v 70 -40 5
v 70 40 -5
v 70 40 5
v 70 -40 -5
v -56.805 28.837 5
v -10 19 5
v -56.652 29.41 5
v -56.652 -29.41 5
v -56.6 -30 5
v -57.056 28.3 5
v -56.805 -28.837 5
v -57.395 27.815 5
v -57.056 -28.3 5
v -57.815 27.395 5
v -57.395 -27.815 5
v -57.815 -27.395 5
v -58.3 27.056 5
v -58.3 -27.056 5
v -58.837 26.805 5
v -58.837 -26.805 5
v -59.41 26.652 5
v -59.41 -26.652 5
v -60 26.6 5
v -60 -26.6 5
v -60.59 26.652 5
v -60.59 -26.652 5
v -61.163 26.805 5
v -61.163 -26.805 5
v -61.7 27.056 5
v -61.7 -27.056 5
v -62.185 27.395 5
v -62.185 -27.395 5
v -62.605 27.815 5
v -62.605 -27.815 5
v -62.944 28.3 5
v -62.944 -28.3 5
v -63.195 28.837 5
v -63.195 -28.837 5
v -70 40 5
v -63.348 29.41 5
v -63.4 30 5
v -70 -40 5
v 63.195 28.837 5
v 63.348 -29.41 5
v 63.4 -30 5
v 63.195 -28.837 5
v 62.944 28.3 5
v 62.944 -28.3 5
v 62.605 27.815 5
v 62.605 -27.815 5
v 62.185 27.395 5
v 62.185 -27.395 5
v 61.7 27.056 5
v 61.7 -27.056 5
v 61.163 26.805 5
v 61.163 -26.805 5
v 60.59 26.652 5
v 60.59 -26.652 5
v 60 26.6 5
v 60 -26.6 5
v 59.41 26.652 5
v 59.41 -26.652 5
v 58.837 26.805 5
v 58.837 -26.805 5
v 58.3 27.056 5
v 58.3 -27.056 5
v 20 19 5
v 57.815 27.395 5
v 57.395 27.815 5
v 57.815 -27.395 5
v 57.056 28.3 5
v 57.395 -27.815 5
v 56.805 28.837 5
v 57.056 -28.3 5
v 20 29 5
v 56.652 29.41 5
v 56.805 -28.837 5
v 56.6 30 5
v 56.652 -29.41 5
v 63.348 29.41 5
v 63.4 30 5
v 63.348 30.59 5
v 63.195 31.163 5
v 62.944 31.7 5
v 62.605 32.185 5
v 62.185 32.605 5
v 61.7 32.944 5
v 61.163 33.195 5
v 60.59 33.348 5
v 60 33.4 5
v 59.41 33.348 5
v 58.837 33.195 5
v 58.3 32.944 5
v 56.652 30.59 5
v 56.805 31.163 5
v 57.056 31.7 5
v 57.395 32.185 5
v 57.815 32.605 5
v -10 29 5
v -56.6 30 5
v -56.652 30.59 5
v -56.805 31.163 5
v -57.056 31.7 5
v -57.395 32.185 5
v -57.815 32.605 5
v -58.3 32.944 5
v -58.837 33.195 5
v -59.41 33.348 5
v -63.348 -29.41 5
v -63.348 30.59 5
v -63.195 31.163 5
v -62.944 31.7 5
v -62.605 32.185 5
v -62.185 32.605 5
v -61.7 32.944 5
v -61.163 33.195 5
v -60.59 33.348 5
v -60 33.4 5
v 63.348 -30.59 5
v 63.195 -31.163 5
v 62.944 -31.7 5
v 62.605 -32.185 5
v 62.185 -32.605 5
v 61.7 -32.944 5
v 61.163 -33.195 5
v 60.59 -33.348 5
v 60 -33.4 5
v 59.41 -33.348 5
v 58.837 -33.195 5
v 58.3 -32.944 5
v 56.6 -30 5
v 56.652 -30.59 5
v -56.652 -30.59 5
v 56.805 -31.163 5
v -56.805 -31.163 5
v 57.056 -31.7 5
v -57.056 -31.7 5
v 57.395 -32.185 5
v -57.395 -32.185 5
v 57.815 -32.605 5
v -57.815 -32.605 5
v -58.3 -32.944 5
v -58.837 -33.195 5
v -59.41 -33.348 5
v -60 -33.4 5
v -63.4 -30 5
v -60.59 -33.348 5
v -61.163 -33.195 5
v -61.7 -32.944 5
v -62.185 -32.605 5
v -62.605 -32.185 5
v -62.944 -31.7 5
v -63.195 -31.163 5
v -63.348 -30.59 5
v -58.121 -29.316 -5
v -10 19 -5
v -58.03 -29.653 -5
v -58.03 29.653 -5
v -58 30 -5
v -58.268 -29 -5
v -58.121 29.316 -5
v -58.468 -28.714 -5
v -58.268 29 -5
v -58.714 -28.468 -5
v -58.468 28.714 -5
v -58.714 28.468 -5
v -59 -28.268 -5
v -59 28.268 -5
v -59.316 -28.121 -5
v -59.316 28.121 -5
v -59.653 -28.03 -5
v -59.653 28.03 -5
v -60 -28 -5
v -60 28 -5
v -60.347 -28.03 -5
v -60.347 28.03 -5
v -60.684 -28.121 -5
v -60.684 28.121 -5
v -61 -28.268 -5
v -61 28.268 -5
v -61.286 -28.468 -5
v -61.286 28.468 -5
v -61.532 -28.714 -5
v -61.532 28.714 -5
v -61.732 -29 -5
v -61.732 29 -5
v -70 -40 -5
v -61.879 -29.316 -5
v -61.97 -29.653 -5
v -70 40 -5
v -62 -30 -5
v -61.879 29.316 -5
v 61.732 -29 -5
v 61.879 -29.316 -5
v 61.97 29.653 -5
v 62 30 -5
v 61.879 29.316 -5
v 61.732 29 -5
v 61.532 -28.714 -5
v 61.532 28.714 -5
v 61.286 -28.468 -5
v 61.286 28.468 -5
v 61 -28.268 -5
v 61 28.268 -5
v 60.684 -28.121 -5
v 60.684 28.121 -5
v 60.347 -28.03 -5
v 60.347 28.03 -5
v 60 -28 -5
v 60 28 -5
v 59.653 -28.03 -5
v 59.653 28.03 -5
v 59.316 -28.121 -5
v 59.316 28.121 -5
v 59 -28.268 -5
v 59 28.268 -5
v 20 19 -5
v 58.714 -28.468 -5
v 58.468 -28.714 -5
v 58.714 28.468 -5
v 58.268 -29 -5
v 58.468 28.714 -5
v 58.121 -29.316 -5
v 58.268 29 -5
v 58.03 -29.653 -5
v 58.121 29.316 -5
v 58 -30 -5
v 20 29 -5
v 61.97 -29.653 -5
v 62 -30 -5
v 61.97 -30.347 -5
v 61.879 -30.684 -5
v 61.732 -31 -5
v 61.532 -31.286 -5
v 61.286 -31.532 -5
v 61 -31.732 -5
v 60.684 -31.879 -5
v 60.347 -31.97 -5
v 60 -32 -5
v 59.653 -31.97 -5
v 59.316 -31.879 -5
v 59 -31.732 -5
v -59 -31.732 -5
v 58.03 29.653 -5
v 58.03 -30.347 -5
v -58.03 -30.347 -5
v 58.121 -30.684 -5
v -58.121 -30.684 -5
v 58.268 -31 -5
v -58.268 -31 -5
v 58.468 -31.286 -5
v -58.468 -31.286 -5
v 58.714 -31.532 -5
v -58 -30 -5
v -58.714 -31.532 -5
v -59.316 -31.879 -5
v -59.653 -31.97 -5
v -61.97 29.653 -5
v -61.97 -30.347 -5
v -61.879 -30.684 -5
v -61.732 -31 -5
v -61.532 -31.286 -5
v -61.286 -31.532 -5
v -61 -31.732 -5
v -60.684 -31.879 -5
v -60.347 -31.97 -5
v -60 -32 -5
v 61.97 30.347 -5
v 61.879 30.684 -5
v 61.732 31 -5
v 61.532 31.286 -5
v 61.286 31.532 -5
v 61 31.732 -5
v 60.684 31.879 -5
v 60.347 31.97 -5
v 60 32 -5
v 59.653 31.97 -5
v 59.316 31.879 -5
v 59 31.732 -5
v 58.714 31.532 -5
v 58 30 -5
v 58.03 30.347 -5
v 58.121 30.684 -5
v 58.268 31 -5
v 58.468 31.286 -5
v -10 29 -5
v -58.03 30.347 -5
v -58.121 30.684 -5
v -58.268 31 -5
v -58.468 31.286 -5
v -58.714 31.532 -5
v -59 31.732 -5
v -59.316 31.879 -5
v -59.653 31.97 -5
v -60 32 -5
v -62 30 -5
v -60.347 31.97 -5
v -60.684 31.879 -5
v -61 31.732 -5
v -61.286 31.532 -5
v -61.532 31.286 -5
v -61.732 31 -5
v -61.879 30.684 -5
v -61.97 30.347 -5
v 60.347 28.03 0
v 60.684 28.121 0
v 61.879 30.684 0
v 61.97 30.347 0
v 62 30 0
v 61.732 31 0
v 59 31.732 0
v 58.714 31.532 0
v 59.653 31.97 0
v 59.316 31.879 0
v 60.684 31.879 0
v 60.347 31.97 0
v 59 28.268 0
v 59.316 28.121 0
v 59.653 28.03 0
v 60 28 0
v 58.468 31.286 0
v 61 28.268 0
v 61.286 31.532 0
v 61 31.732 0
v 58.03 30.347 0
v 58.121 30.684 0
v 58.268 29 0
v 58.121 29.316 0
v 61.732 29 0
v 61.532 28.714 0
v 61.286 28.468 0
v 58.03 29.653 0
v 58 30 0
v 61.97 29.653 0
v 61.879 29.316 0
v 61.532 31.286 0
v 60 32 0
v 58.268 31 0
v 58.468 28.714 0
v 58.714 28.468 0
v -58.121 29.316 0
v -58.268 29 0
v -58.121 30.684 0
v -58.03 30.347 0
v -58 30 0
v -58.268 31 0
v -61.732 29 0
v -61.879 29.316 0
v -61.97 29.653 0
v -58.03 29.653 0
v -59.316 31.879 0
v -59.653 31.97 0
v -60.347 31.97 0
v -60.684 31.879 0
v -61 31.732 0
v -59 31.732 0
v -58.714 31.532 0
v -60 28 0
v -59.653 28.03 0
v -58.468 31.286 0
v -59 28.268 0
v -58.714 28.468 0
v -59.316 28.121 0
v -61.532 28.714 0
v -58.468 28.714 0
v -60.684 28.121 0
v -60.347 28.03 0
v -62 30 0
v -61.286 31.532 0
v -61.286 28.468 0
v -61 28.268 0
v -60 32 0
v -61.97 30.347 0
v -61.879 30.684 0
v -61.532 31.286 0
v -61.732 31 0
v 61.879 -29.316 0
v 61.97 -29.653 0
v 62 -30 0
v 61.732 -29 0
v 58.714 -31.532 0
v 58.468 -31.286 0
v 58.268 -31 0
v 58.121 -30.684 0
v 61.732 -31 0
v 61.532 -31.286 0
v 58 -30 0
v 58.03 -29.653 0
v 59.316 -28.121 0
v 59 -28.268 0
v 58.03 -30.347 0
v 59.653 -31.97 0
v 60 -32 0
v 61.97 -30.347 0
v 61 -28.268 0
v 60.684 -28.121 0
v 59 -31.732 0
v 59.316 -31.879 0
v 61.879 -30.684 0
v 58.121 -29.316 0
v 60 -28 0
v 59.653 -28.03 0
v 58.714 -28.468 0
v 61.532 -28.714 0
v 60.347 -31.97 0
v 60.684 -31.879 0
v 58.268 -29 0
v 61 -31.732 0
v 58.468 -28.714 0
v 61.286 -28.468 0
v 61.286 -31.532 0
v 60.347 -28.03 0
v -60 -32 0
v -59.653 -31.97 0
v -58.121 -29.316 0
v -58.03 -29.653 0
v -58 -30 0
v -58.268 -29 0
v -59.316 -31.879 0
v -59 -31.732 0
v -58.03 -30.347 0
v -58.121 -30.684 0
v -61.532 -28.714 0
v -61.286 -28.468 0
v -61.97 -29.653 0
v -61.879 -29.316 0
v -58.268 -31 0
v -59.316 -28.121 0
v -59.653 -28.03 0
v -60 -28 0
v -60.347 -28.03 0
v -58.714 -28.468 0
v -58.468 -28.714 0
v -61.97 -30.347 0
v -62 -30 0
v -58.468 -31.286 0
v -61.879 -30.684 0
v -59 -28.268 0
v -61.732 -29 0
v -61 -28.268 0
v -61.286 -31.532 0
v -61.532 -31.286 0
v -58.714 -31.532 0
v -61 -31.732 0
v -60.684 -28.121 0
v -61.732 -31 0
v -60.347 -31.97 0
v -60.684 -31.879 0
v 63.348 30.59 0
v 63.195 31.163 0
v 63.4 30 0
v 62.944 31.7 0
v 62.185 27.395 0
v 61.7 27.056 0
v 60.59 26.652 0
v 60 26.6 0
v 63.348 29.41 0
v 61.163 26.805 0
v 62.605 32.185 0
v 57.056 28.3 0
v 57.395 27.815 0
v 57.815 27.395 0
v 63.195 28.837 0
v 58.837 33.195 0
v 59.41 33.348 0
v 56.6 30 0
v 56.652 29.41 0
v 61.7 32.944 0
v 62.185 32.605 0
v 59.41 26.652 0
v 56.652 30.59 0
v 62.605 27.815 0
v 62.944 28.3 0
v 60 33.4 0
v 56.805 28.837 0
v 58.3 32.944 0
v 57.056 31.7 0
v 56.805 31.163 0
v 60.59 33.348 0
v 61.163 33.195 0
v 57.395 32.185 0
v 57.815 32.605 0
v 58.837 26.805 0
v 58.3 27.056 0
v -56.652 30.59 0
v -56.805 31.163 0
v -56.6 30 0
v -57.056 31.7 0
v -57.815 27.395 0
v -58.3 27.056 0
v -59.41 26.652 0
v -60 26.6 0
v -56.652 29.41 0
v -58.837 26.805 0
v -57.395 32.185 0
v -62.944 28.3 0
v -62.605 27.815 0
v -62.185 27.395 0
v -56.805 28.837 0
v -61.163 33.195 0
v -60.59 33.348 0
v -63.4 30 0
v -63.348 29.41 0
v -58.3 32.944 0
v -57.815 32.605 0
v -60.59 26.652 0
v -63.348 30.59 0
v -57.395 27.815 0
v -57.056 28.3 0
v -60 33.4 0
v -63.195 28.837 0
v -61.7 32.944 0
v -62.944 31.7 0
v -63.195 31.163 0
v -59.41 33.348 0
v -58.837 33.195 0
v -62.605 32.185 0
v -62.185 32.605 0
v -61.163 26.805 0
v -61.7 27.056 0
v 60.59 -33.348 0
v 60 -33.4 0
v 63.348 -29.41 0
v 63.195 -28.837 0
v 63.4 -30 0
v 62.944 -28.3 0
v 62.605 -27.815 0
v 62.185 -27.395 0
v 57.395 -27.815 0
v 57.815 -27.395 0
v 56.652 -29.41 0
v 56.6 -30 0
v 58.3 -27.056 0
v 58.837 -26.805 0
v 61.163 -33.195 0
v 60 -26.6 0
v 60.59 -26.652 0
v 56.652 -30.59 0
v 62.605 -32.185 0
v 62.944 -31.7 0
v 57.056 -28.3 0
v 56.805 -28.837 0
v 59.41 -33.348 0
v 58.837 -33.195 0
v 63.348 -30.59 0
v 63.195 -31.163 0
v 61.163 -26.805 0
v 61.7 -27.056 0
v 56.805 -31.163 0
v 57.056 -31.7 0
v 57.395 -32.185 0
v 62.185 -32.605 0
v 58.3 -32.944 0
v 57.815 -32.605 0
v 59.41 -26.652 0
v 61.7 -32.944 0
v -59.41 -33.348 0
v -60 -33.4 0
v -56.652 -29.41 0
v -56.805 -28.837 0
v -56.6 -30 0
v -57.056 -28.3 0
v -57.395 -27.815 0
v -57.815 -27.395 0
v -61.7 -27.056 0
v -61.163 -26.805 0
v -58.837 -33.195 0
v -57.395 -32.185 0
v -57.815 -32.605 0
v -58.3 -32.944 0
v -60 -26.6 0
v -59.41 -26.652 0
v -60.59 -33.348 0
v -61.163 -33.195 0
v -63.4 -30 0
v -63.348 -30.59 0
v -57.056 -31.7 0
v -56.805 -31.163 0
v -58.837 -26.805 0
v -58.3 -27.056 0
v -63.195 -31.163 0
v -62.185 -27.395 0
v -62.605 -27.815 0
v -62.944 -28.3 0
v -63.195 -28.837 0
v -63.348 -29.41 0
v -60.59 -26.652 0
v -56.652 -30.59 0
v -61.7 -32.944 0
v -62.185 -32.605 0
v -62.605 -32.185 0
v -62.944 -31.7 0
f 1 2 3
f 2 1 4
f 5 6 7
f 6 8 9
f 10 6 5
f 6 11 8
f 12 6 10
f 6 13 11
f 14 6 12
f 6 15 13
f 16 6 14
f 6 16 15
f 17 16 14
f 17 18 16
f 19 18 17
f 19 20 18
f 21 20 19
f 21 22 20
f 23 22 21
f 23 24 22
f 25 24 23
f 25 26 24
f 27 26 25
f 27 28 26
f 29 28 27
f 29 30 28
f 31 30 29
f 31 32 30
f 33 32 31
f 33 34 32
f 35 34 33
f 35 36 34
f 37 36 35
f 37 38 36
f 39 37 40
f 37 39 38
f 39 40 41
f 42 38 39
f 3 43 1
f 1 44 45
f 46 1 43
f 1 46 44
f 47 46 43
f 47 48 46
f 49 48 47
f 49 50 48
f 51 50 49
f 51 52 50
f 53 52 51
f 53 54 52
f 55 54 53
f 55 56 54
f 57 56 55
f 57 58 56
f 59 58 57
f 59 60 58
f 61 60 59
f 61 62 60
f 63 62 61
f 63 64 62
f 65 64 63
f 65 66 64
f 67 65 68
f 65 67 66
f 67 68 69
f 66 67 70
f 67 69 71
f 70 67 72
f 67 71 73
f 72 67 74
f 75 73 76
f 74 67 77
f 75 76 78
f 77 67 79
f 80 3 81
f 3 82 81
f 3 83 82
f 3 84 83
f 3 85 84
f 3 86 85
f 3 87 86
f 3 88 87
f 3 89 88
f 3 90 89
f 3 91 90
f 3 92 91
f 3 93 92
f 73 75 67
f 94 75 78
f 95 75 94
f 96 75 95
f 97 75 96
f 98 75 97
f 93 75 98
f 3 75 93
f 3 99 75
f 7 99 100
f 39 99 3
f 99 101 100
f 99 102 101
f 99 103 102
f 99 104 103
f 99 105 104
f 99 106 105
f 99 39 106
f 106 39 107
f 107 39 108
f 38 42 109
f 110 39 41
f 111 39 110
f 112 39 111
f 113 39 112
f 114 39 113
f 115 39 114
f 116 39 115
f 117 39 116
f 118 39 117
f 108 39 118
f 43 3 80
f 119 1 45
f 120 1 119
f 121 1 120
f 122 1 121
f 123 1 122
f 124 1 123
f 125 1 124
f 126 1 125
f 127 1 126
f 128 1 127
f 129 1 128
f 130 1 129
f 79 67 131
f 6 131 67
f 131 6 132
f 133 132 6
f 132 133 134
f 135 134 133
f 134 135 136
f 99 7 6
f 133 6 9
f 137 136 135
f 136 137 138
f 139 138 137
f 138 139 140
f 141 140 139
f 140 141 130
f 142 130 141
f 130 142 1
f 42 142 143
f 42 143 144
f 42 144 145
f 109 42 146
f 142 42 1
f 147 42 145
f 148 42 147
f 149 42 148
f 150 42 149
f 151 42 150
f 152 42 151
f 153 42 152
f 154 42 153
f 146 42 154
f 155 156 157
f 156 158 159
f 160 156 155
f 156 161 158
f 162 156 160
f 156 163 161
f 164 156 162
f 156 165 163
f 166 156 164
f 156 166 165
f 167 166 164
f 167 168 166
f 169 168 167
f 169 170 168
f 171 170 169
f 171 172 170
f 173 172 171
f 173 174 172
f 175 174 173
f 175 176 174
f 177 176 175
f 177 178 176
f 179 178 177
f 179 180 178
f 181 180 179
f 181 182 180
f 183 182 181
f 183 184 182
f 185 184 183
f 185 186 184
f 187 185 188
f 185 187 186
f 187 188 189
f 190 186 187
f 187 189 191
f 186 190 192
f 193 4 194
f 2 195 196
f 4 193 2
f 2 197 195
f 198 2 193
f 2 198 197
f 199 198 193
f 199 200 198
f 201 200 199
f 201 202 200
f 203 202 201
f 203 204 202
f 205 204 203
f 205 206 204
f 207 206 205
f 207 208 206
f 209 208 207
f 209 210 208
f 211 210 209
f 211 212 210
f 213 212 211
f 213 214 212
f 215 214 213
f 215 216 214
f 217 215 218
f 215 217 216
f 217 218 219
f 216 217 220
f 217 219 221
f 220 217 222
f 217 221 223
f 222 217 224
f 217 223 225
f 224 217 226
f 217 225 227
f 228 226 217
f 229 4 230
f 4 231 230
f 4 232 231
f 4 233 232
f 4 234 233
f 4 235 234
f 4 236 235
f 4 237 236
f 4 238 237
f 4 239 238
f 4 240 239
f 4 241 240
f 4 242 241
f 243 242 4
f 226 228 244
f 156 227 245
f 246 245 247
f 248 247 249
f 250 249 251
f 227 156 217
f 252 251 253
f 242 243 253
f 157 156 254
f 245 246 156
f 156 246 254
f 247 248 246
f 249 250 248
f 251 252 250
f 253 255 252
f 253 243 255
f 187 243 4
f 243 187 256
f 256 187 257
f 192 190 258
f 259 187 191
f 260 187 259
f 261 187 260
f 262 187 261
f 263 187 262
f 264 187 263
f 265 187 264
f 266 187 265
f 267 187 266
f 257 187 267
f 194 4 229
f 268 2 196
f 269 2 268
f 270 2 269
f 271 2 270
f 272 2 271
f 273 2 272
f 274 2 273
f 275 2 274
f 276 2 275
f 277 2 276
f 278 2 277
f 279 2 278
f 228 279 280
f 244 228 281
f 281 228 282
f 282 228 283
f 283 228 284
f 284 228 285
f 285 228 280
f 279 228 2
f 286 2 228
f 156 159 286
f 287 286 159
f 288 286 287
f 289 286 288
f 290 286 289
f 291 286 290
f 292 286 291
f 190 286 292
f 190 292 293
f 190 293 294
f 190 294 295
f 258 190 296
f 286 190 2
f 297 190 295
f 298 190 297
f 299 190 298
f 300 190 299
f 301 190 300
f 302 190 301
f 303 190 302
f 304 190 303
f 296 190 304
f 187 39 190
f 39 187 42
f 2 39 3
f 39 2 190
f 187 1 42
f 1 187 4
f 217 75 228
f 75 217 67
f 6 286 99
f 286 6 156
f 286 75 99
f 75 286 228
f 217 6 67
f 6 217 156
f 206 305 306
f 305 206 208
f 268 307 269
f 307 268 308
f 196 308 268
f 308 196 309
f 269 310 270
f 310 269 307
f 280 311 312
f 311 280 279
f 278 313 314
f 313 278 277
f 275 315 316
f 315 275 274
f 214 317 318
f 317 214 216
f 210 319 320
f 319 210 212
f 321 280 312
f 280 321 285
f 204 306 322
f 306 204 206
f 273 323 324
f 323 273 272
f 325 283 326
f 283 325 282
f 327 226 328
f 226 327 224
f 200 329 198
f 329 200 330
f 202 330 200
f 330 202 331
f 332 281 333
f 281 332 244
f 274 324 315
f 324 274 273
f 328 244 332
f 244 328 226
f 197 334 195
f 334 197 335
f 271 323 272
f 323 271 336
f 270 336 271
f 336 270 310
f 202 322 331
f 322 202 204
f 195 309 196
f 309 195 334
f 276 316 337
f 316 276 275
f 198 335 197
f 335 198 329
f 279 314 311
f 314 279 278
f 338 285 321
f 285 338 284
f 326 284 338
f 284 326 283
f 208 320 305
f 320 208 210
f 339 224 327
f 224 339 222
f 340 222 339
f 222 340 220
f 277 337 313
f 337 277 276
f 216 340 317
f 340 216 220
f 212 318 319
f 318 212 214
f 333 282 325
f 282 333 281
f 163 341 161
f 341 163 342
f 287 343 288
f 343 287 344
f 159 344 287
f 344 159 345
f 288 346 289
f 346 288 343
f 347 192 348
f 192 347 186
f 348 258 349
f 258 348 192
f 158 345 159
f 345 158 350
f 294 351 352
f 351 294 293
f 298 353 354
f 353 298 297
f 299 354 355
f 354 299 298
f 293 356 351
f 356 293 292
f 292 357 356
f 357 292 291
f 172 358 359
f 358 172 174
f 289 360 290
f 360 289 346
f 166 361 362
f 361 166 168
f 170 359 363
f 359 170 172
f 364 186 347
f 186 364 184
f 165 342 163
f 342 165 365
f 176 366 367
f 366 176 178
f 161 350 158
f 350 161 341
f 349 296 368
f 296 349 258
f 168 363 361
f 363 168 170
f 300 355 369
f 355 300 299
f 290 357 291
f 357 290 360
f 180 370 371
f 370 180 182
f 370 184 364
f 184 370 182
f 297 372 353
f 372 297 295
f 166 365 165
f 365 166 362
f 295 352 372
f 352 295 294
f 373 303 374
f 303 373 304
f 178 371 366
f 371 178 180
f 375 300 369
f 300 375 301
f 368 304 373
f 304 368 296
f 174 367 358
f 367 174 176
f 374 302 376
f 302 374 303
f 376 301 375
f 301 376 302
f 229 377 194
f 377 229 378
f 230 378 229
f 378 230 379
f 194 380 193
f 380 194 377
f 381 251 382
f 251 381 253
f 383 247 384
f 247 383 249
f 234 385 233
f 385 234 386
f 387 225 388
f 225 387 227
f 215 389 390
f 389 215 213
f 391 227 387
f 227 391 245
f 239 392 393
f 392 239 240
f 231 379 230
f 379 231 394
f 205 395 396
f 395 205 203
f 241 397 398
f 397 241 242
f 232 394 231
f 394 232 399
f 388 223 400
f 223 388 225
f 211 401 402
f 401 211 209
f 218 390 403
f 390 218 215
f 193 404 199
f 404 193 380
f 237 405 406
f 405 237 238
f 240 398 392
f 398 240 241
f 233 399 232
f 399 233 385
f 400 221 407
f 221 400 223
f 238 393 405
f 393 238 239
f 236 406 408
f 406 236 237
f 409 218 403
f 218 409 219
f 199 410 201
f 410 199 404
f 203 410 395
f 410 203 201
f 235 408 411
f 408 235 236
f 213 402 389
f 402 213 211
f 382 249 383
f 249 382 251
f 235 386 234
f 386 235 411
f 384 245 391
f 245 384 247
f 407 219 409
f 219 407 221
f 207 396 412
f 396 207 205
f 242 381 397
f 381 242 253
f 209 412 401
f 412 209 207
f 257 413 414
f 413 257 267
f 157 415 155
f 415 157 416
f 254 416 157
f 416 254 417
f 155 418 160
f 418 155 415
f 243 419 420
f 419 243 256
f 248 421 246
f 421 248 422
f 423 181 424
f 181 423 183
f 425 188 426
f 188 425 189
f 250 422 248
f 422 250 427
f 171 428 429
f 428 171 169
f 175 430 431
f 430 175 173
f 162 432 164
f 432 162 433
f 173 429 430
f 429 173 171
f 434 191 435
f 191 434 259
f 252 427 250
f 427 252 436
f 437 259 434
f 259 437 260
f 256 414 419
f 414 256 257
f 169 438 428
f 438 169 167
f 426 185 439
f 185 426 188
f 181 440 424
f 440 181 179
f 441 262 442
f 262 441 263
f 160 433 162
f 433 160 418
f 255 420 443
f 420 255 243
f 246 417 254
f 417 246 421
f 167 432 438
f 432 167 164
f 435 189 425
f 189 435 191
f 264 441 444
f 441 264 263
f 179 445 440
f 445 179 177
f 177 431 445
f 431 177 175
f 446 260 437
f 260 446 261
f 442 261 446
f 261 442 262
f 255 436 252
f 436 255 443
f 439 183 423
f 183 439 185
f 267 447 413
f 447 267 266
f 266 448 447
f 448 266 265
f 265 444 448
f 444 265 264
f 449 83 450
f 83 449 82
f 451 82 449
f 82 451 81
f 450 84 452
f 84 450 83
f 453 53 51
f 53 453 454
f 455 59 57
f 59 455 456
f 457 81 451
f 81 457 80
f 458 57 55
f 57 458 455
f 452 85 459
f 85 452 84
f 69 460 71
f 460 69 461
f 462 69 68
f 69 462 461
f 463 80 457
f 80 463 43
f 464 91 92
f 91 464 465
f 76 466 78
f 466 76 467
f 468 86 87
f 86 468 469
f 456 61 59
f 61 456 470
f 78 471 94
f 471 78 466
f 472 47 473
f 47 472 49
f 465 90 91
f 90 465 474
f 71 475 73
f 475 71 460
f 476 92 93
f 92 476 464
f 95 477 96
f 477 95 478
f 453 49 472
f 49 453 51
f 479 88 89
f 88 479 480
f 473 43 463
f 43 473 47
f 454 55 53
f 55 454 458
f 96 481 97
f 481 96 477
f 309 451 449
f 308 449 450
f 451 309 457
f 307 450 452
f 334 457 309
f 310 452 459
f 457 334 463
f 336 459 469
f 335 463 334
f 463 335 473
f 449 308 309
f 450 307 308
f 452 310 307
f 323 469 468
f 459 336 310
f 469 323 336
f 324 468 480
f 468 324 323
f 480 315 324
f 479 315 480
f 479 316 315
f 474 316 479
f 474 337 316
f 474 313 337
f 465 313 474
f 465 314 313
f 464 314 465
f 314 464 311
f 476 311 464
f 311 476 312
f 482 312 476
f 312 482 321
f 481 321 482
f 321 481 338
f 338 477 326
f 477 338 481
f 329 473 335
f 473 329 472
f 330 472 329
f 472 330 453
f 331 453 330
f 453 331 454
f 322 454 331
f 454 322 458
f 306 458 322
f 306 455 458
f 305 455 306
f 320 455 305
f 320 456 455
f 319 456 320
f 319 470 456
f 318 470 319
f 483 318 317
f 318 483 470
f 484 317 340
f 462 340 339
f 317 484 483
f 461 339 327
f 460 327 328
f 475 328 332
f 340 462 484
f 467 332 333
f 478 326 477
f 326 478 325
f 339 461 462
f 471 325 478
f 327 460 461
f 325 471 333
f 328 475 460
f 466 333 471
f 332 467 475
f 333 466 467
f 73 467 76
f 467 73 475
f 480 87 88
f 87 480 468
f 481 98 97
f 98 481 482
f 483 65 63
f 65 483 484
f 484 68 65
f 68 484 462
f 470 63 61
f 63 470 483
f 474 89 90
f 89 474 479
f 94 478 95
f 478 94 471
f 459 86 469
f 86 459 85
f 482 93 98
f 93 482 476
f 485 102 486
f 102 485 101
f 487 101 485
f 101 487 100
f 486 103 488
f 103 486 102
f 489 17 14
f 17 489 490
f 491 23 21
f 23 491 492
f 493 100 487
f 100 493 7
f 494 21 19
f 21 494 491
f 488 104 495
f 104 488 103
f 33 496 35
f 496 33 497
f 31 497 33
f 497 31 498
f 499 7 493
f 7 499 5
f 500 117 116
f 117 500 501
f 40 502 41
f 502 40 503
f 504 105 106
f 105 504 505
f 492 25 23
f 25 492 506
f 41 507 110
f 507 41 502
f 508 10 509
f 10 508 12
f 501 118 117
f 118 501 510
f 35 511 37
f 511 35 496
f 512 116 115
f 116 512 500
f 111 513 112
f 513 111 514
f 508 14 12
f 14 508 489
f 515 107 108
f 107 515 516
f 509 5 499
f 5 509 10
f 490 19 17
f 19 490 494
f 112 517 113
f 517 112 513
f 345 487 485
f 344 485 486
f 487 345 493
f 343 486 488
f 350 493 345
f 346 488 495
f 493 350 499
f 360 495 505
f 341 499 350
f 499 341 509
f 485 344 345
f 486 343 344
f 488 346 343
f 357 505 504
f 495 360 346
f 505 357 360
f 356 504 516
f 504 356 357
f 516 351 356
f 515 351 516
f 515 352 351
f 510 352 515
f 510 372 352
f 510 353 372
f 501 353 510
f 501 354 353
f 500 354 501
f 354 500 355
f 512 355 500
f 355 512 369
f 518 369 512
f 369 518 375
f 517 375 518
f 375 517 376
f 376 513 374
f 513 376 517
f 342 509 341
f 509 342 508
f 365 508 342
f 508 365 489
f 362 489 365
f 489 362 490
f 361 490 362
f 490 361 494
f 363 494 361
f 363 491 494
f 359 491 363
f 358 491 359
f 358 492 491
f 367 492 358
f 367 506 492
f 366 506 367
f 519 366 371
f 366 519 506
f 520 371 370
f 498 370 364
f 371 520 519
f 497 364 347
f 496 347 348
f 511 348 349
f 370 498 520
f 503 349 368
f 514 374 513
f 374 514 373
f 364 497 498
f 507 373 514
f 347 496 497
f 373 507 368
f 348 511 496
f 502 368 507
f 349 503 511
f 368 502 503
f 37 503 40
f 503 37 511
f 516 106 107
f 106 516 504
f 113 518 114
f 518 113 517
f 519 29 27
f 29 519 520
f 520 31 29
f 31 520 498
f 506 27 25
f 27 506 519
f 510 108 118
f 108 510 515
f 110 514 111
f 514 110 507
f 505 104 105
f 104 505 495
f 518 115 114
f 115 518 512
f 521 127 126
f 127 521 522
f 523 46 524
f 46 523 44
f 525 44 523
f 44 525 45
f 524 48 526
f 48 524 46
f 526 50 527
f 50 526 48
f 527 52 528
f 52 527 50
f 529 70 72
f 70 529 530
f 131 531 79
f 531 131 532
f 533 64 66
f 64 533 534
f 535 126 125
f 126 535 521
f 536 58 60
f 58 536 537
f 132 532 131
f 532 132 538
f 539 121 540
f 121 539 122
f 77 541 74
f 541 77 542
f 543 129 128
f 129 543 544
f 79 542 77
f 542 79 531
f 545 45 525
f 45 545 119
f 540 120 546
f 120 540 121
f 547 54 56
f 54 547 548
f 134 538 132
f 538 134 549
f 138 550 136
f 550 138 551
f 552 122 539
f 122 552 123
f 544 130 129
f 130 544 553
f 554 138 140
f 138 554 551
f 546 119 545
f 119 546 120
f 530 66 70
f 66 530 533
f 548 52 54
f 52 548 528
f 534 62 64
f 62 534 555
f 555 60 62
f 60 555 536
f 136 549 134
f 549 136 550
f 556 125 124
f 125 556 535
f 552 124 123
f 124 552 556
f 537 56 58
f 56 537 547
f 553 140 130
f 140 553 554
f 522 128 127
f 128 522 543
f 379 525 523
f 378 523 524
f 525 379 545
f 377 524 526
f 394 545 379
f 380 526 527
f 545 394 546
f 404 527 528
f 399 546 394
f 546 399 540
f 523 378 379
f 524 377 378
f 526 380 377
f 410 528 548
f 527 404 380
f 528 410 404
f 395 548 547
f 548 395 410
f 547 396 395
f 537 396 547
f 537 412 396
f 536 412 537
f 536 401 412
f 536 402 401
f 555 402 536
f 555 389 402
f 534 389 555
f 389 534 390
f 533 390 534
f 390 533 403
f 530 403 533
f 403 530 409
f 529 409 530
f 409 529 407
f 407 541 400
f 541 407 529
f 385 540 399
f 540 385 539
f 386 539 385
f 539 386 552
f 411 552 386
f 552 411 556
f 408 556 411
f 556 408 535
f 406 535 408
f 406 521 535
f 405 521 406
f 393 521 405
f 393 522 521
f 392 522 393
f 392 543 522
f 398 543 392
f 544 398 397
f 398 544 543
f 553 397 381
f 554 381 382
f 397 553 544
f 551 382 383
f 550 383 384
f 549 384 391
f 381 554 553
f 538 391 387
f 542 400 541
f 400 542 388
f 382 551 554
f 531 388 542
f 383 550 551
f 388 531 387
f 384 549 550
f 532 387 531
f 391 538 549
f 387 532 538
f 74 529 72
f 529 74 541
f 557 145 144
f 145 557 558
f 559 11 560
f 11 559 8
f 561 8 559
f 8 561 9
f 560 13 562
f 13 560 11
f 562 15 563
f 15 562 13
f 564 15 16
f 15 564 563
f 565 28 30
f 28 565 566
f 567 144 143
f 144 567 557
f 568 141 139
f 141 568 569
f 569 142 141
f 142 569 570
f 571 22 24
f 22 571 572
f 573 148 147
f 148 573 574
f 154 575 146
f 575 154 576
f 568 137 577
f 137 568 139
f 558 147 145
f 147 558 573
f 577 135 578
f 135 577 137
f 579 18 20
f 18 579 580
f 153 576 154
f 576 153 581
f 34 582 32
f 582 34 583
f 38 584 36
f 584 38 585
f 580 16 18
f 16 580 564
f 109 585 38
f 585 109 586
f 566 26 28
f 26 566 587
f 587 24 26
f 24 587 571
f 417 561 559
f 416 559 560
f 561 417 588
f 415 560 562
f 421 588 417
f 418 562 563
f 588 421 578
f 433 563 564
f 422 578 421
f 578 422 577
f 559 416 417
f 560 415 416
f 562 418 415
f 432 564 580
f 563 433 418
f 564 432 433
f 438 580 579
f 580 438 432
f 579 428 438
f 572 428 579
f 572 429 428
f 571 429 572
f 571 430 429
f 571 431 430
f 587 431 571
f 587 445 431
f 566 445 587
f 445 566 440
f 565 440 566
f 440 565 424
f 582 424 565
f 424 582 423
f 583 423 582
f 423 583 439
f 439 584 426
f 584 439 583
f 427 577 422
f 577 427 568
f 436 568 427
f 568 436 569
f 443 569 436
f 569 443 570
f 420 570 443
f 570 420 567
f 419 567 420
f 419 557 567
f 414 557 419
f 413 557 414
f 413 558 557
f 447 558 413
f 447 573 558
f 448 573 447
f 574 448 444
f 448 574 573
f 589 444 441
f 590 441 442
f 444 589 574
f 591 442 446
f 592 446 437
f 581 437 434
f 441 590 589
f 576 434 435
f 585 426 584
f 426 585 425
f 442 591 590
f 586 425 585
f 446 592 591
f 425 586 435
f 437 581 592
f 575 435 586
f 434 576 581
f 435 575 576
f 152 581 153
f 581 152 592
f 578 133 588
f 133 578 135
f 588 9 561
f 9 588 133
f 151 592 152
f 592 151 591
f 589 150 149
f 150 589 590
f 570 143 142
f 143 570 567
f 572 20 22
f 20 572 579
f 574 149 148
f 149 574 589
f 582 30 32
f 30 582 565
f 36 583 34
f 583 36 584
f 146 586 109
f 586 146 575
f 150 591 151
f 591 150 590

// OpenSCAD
difference(){
    cube([140,80,10], center=true);
    translate([5,24,0])
        cube([30,10,12], center=true);
    translate([60,30,0])
        cylinder(h=30, r=2, $fn=36, center=true);
    translate([-60,30,0])
        cylinder(h=30, r=2, $fn=36, center=true);
    translate([60,-30,0])
        cylinder(h=30, r=2, $fn=36, center=true);
    translate([-60,-30,0])
        cylinder(h=30, r=2, $fn=36, center=true);
    translate([60,30,15])
        cylinder(h=30, r=3.4, $fn=36, center=true);
    translate([-60,30,15])
        cylinder(h=30, r=3.4, $fn=36, center=true);
    translate([60,-30,15])
        cylinder(h=30, r=3.4, $fn=36, center=true);
    translate([-60,-30,15])
        cylinder(h=30, r=3.4, $fn=36, center=true);
};
